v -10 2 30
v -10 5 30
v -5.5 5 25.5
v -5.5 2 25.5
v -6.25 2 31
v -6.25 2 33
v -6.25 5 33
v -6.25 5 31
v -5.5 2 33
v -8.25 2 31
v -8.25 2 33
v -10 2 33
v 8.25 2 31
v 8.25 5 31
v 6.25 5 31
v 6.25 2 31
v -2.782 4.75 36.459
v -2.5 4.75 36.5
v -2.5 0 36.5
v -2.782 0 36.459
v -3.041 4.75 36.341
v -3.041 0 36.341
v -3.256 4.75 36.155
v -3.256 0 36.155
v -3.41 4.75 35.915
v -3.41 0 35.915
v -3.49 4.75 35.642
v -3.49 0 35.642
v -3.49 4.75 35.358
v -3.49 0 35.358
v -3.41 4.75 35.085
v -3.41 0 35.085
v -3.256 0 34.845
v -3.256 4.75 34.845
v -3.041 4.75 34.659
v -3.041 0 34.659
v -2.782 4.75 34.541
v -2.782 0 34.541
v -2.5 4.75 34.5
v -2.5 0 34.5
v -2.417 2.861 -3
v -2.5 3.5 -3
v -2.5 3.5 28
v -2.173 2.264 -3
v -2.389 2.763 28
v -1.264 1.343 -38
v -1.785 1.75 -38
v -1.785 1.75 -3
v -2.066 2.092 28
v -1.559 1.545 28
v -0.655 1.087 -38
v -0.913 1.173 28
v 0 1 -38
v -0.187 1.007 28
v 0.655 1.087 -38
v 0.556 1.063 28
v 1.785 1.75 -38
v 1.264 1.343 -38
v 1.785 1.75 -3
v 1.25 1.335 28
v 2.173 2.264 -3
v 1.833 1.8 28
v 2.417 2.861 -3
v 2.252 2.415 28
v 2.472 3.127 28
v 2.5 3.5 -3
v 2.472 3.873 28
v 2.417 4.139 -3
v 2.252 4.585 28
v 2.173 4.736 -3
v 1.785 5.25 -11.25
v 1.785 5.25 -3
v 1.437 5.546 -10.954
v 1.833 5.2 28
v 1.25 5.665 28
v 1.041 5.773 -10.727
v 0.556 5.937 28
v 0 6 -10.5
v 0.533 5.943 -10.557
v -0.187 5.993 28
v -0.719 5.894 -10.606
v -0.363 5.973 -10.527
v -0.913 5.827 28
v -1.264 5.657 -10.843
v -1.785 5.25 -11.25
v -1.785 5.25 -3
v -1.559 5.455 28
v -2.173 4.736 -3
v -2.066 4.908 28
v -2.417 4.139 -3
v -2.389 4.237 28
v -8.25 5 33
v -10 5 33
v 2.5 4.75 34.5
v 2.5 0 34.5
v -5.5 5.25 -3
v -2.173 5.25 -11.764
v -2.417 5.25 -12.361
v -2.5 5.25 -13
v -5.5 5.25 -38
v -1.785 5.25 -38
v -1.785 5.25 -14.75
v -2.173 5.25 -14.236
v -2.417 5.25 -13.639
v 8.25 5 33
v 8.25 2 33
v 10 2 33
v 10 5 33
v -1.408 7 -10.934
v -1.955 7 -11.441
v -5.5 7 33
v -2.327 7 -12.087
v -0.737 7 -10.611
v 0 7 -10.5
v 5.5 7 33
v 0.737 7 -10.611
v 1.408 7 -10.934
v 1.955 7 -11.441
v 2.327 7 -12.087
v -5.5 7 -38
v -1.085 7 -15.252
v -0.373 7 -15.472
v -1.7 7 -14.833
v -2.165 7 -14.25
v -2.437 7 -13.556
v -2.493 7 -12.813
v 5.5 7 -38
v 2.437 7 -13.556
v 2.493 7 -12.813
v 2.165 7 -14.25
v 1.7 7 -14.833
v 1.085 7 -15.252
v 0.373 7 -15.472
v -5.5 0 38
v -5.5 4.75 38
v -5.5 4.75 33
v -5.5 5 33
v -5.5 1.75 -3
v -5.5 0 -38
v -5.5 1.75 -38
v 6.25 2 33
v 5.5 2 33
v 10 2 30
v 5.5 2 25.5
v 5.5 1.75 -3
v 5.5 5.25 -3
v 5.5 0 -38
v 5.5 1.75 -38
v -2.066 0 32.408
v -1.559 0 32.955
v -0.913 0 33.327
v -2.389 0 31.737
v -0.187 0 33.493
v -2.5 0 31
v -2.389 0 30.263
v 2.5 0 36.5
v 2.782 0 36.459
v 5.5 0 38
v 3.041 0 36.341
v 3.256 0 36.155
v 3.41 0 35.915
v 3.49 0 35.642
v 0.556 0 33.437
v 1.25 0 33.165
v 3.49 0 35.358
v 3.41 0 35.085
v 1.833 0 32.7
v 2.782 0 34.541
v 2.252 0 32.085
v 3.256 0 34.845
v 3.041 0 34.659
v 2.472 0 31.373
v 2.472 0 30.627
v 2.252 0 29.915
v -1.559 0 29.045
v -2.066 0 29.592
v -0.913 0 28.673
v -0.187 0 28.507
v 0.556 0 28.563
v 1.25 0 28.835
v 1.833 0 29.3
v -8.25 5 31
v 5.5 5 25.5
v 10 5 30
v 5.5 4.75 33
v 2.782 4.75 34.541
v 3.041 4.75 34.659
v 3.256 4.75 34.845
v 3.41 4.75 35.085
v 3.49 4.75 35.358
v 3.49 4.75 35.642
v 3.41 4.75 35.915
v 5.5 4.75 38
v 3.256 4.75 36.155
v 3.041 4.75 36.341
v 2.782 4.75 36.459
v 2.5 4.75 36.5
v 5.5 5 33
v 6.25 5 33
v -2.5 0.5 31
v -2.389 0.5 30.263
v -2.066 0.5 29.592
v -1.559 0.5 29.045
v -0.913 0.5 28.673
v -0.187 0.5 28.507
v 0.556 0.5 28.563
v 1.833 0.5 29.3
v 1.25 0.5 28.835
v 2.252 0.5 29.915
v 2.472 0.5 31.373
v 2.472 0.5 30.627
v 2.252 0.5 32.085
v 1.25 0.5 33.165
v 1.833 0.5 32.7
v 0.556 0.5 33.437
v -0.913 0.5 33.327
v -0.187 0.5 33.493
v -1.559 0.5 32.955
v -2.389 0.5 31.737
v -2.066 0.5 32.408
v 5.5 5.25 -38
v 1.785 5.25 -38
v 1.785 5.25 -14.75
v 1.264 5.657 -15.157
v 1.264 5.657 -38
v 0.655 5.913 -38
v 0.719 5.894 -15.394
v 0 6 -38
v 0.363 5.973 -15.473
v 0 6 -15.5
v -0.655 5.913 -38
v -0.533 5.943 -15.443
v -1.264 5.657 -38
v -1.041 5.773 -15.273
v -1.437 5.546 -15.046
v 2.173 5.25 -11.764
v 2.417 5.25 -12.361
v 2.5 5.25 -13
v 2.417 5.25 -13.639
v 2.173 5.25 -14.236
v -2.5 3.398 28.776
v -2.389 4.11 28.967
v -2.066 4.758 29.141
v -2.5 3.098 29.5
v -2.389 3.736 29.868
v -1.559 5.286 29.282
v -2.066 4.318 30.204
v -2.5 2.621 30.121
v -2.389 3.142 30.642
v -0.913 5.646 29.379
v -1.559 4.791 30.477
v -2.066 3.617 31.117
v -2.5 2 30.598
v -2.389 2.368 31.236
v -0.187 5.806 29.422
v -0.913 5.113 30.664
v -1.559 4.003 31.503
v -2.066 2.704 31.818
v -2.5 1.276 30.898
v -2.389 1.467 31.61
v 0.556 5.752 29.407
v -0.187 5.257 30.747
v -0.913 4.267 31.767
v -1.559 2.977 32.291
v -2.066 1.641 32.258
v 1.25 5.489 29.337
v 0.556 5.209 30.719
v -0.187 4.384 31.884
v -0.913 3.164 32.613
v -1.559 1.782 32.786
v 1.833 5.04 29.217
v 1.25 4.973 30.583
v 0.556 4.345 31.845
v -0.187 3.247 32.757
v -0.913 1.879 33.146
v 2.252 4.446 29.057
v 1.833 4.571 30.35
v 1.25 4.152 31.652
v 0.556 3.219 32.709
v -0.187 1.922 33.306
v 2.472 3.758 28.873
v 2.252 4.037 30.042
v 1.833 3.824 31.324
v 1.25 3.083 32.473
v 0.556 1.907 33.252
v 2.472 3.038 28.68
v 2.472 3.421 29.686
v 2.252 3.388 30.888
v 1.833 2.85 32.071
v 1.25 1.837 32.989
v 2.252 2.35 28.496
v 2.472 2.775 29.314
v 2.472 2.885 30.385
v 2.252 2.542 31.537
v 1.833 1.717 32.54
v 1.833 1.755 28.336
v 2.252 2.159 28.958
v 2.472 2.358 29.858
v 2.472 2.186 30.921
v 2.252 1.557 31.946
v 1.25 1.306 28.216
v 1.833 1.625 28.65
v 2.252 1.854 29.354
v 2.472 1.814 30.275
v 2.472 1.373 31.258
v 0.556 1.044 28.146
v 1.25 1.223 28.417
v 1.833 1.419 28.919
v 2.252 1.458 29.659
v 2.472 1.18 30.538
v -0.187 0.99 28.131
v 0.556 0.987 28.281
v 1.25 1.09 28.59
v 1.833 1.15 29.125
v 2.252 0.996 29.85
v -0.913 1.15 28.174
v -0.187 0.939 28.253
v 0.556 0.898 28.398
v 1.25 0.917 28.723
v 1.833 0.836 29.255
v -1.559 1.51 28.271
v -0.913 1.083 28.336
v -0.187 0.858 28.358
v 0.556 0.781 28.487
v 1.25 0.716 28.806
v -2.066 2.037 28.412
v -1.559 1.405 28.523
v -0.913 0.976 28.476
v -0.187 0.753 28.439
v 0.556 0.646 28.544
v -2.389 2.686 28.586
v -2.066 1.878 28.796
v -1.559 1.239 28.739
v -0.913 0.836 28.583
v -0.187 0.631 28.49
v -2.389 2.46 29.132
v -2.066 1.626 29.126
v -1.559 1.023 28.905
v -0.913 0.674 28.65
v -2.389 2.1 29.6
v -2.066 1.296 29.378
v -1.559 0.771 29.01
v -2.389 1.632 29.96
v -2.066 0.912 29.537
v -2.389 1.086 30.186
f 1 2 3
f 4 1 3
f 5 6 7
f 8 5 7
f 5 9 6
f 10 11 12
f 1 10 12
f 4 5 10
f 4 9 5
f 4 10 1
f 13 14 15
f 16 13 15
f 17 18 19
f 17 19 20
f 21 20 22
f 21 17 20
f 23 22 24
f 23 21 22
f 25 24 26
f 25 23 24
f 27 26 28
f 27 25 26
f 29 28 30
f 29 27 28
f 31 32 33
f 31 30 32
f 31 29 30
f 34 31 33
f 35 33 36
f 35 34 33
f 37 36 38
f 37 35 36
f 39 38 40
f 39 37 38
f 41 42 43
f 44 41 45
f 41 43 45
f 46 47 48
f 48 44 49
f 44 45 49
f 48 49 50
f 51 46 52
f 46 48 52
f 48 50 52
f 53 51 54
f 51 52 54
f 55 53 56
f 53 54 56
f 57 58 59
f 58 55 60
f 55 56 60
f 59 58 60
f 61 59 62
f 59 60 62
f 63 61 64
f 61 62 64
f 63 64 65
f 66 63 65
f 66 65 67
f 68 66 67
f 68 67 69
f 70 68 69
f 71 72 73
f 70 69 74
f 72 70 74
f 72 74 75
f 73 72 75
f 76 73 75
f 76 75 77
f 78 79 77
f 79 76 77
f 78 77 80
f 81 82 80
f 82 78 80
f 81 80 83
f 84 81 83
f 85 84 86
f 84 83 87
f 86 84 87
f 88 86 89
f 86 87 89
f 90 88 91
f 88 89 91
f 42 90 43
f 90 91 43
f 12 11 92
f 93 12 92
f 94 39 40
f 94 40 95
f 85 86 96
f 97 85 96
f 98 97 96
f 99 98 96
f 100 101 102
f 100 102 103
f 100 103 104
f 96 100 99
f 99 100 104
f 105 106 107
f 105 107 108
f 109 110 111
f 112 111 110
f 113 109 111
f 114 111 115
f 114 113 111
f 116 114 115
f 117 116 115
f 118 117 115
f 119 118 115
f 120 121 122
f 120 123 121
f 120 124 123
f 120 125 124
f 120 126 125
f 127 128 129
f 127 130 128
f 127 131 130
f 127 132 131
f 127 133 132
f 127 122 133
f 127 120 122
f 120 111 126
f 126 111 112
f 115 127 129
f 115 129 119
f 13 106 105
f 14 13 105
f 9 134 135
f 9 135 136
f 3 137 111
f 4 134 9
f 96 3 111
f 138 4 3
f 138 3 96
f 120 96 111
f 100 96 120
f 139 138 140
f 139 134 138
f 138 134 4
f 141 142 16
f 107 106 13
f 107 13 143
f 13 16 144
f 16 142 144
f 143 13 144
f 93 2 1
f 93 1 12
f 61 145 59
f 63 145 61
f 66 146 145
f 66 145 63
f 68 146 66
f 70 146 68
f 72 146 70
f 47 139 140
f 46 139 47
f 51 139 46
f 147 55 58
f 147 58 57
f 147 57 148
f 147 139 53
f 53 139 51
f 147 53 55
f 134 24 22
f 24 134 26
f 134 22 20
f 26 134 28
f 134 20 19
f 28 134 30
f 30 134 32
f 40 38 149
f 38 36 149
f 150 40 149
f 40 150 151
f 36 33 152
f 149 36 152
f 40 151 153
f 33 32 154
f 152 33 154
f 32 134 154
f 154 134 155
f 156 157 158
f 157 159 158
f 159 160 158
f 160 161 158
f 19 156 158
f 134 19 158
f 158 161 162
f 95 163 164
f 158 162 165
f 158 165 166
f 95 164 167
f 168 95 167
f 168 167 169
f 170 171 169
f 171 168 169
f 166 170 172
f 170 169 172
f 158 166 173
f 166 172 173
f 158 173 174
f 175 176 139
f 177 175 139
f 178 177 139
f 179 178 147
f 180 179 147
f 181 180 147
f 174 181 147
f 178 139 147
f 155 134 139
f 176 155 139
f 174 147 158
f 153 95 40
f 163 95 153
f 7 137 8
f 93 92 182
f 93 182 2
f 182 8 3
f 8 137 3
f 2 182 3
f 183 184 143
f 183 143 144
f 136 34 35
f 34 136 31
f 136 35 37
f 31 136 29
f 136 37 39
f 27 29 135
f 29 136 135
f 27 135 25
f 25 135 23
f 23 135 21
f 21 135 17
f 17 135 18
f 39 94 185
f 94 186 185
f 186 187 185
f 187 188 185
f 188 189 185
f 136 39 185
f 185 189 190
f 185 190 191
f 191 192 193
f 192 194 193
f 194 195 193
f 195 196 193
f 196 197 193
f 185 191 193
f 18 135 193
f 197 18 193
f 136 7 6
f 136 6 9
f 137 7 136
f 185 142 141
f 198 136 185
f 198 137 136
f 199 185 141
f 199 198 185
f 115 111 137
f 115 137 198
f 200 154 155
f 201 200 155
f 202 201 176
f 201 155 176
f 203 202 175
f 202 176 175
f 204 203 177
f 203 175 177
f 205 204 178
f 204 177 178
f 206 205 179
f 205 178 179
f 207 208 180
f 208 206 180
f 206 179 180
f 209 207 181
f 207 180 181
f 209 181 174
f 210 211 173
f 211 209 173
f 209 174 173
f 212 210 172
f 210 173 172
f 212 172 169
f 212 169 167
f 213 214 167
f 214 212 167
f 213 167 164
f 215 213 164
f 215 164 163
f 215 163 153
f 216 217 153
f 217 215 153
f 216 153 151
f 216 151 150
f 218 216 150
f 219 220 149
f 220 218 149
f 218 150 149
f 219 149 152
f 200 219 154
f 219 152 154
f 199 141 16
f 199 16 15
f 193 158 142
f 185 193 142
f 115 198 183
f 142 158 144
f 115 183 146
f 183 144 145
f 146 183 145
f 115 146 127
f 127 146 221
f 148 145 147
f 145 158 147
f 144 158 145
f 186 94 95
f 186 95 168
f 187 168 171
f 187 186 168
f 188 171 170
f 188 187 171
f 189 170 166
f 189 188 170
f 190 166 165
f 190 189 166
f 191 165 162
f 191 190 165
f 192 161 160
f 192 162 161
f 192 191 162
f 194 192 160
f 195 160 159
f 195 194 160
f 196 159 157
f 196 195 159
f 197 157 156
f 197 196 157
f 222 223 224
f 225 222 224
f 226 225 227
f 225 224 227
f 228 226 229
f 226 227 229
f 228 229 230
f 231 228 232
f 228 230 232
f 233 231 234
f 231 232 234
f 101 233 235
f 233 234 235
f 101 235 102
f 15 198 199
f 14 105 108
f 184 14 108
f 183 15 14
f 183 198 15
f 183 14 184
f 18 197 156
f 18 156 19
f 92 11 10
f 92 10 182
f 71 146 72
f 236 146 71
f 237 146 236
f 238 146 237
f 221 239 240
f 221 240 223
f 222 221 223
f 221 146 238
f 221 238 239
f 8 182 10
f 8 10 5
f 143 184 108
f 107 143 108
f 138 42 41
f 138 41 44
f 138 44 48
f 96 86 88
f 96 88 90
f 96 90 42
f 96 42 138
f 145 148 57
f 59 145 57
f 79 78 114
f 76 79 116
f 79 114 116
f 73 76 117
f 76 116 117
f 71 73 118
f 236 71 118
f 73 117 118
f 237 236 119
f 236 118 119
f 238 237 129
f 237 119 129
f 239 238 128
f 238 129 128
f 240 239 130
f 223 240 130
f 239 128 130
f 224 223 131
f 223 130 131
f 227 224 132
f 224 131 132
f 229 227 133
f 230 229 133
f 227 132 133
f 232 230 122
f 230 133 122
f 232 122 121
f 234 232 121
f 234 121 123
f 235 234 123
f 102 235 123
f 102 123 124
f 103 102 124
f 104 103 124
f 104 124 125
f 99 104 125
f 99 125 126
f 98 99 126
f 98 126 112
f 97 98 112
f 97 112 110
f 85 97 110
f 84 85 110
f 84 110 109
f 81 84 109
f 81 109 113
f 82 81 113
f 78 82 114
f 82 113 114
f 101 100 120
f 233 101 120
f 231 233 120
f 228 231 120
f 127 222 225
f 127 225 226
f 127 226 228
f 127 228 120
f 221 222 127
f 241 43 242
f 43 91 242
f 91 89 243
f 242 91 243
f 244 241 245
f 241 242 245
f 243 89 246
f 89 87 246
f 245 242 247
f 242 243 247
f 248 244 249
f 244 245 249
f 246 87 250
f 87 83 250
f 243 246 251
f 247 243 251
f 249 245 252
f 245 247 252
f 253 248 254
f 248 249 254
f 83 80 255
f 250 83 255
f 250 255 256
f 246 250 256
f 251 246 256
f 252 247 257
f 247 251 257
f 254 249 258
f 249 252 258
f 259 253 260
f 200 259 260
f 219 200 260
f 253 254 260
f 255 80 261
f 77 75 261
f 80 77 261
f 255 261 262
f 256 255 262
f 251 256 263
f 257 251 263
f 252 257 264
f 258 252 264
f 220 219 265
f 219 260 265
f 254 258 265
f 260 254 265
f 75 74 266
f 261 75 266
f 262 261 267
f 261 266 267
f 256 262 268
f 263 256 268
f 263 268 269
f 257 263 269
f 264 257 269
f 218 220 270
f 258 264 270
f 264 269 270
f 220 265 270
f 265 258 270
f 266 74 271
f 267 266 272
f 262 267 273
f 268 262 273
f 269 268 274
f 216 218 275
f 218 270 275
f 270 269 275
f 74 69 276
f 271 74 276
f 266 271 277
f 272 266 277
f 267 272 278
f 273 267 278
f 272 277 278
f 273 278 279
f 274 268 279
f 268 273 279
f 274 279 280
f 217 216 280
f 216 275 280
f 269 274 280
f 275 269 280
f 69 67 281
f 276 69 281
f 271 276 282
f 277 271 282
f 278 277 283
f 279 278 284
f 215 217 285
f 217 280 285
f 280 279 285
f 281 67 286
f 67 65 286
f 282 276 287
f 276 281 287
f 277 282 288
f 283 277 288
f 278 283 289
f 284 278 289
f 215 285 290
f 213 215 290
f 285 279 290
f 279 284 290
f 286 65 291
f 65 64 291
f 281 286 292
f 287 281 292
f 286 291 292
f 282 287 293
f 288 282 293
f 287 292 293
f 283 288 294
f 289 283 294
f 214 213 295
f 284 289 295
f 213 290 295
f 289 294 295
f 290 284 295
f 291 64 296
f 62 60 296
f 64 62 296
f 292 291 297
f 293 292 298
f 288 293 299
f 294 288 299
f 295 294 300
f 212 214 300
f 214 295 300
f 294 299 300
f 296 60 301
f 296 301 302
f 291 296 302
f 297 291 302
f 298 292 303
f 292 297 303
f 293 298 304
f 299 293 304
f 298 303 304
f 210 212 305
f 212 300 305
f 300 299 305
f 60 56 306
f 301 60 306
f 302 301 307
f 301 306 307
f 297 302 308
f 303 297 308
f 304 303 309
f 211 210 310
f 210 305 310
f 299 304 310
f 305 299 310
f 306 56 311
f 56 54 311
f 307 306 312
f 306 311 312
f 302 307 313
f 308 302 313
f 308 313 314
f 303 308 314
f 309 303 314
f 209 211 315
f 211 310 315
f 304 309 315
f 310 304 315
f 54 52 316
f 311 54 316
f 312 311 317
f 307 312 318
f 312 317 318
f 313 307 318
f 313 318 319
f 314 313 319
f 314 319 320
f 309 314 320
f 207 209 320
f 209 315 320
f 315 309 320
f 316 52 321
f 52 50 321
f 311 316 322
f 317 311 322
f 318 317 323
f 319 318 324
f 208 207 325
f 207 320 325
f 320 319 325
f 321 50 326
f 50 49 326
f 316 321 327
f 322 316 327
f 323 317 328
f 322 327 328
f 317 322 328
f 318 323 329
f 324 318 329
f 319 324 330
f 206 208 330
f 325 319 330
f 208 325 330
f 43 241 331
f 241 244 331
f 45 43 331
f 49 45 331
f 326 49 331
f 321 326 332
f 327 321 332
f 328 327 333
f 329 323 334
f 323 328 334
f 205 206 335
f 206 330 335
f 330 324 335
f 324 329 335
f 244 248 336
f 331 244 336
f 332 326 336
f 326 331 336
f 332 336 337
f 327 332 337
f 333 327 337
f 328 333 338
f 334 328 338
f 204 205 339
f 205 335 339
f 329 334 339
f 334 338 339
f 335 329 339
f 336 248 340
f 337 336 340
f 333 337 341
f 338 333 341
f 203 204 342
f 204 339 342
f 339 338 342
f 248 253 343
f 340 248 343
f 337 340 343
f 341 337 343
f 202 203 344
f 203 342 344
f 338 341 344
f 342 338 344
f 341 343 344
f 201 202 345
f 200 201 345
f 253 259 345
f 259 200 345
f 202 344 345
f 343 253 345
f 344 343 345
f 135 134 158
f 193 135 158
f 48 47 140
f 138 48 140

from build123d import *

# Parameters (mm, degrees)
SKETCH1_W           = 11
SKETCH1_H           = 76
BOSS_EXTRUDE1_DEPTH = 7
SKETCH4_R           = 2.5
SKETCH5_W           = 3
SKETCH5_H           = 3
BOSS_EXTRUDE2_DEPTH = 4.5
SKETCH6_W           = 2
SKETCH6_H           = 3
CUT_EXTRUDE2_DEPTH  = 2
BOSS_EXTRUDE3_DEPTH = 3
SKETCH10_W          = 11
SKETCH10_H          = 3.5
CUT_EXTRUDE5_DEPTH  = 35
CUT_EXTRUDE6_REACH  = 41.912
SKETCH11_R          = 2.5
SKETCH12_W          = 11
SKETCH12_H          = 2.25
CUT_EXTRUDE9_DEPTH  = 5
CUT_EXTRUDE10_REACH = 41.58


with BuildPart() as part:
    # Sketch1 → Boss-Extrude1 (new body)
    with BuildSketch(Plane(origin=(0, 0, 0), x_dir=(1, 0, 0), z_dir=(0, 1, 0))):
        Rectangle(SKETCH1_W, SKETCH1_H)
    extrude(amount=BOSS_EXTRUDE1_DEPTH)

    # Cut-Sweep2: sweep along a path in Sketch3
    with BuildLine(Plane.ZY) as cut_sweep2_path:
        Line((-38, 3.5), (28, 3.5))
        ThreePointArc((28, 3.5), (30.121320344, 2.621320344), (31, 0.5))
        Line((31, 0.5), (31, 0))
    # Sketch4 → Cut-Sweep2 (sweep, cut)
    with BuildSketch(Plane(origin=(0, 0, -38), x_dir=(-1, 0, 0), z_dir=(0, 0, -1))):
        with Locations((0, 3.5)):
            Circle(SKETCH4_R)
    sweep(path=cut_sweep2_path.line, mode=Mode.SUBTRACT)

    # Sketch5 → Boss-Extrude2 (add)
    with BuildSketch(Plane.ZY.offset(5.5)):
        with Locations((31.5, 3.5)):
            Rectangle(SKETCH5_W, SKETCH5_H)
    boss_extrude2 = extrude(amount=BOSS_EXTRUDE2_DEPTH)

    # Mirror1: Boss-Extrude2 across plane
    add(boss_extrude2.mirror(Plane.ZY))

    # Sketch6 → Cut-Extrude2 (cut)
    with BuildSketch(Plane.XY.offset(33)):
        with Locations((-7.25, 3.5)):
            Rectangle(SKETCH6_W, SKETCH6_H)
    cut_extrude2 = extrude(amount=-CUT_EXTRUDE2_DEPTH, mode=Mode.SUBTRACT)

    # Mirror2: Cut-Extrude2 across plane
    add(cut_extrude2.mirror(Plane.ZY), mode=Mode.SUBTRACT)

    # Sketch7 → Boss-Extrude3 (add)
    with BuildSketch(Plane(origin=(0, 5, 0), x_dir=(1, 0, 0), z_dir=(0, 1, 0))):
        Polygon((-10, -30), (-5.5, -25.5), (-5.5, -30), align=None)
    boss_extrude3 = extrude(amount=-BOSS_EXTRUDE3_DEPTH)

    # Mirror3: Boss-Extrude3 across plane
    add(boss_extrude3.mirror(Plane.ZY))

    # Sketch10 → Cut-Extrude5 (cut)
    with BuildSketch(Plane(origin=(0, 0, -38), x_dir=(-1, 0, 0), z_dir=(0, 0, -1))):
        with Locations((0, 3.5)):
            Rectangle(SKETCH10_W, SKETCH10_H)
    extrude(amount=-CUT_EXTRUDE5_DEPTH, mode=Mode.SUBTRACT)

    # Sketch11 → Cut-Extrude6 (cut, up to next)
    with BuildSketch(Plane(origin=(0, 7, 0), x_dir=(1, 0, 0), z_dir=(0, 1, 0)), mode=Mode.PRIVATE) as cut_extrude6_sk1:
        with Locations(Location((0, 13, 0), (0, 0, 270))):
            Circle(SKETCH11_R)
    cut_extrude6_tool1 = extrude(cut_extrude6_sk1.sketch, amount=-CUT_EXTRUDE6_REACH, mode=Mode.PRIVATE) & part.part
    add(cut_extrude6_tool1.solids().sort_by_distance((0, 7, -13))[0], mode=Mode.SUBTRACT)

    # Sketch12 → Cut-Extrude9 (cut)
    with BuildSketch(Plane.XY.offset(38)):
        with Locations((0, 5.875)):
            Rectangle(SKETCH12_W, SKETCH12_H)
    extrude(amount=-CUT_EXTRUDE9_DEPTH, mode=Mode.SUBTRACT)

    # Sketch14 → Cut-Extrude10 (cut, up to next)
    with BuildSketch(Plane(origin=(0, 4.75, 0), x_dir=(1, 0, 0), z_dir=(0, 1, 0)), mode=Mode.PRIVATE) as cut_extrude10_sk1:
        with BuildLine():
            Line((-2.5, -34.5), (2.5, -34.5))
            ThreePointArc((2.5, -34.5), (3.5, -35.5), (2.5, -36.5))
            Line((2.5, -36.5), (-2.5, -36.5))
            ThreePointArc((-2.5, -36.5), (-3.5, -35.5), (-2.5, -34.5))
        make_face()
    cut_extrude10_tool1 = extrude(cut_extrude10_sk1.sketch, amount=-CUT_EXTRUDE10_REACH, mode=Mode.PRIVATE) & part.part
    add(cut_extrude10_tool1.solids().sort_by_distance((0, 4.75, 35.5))[0], mode=Mode.SUBTRACT)


solid = part.part
